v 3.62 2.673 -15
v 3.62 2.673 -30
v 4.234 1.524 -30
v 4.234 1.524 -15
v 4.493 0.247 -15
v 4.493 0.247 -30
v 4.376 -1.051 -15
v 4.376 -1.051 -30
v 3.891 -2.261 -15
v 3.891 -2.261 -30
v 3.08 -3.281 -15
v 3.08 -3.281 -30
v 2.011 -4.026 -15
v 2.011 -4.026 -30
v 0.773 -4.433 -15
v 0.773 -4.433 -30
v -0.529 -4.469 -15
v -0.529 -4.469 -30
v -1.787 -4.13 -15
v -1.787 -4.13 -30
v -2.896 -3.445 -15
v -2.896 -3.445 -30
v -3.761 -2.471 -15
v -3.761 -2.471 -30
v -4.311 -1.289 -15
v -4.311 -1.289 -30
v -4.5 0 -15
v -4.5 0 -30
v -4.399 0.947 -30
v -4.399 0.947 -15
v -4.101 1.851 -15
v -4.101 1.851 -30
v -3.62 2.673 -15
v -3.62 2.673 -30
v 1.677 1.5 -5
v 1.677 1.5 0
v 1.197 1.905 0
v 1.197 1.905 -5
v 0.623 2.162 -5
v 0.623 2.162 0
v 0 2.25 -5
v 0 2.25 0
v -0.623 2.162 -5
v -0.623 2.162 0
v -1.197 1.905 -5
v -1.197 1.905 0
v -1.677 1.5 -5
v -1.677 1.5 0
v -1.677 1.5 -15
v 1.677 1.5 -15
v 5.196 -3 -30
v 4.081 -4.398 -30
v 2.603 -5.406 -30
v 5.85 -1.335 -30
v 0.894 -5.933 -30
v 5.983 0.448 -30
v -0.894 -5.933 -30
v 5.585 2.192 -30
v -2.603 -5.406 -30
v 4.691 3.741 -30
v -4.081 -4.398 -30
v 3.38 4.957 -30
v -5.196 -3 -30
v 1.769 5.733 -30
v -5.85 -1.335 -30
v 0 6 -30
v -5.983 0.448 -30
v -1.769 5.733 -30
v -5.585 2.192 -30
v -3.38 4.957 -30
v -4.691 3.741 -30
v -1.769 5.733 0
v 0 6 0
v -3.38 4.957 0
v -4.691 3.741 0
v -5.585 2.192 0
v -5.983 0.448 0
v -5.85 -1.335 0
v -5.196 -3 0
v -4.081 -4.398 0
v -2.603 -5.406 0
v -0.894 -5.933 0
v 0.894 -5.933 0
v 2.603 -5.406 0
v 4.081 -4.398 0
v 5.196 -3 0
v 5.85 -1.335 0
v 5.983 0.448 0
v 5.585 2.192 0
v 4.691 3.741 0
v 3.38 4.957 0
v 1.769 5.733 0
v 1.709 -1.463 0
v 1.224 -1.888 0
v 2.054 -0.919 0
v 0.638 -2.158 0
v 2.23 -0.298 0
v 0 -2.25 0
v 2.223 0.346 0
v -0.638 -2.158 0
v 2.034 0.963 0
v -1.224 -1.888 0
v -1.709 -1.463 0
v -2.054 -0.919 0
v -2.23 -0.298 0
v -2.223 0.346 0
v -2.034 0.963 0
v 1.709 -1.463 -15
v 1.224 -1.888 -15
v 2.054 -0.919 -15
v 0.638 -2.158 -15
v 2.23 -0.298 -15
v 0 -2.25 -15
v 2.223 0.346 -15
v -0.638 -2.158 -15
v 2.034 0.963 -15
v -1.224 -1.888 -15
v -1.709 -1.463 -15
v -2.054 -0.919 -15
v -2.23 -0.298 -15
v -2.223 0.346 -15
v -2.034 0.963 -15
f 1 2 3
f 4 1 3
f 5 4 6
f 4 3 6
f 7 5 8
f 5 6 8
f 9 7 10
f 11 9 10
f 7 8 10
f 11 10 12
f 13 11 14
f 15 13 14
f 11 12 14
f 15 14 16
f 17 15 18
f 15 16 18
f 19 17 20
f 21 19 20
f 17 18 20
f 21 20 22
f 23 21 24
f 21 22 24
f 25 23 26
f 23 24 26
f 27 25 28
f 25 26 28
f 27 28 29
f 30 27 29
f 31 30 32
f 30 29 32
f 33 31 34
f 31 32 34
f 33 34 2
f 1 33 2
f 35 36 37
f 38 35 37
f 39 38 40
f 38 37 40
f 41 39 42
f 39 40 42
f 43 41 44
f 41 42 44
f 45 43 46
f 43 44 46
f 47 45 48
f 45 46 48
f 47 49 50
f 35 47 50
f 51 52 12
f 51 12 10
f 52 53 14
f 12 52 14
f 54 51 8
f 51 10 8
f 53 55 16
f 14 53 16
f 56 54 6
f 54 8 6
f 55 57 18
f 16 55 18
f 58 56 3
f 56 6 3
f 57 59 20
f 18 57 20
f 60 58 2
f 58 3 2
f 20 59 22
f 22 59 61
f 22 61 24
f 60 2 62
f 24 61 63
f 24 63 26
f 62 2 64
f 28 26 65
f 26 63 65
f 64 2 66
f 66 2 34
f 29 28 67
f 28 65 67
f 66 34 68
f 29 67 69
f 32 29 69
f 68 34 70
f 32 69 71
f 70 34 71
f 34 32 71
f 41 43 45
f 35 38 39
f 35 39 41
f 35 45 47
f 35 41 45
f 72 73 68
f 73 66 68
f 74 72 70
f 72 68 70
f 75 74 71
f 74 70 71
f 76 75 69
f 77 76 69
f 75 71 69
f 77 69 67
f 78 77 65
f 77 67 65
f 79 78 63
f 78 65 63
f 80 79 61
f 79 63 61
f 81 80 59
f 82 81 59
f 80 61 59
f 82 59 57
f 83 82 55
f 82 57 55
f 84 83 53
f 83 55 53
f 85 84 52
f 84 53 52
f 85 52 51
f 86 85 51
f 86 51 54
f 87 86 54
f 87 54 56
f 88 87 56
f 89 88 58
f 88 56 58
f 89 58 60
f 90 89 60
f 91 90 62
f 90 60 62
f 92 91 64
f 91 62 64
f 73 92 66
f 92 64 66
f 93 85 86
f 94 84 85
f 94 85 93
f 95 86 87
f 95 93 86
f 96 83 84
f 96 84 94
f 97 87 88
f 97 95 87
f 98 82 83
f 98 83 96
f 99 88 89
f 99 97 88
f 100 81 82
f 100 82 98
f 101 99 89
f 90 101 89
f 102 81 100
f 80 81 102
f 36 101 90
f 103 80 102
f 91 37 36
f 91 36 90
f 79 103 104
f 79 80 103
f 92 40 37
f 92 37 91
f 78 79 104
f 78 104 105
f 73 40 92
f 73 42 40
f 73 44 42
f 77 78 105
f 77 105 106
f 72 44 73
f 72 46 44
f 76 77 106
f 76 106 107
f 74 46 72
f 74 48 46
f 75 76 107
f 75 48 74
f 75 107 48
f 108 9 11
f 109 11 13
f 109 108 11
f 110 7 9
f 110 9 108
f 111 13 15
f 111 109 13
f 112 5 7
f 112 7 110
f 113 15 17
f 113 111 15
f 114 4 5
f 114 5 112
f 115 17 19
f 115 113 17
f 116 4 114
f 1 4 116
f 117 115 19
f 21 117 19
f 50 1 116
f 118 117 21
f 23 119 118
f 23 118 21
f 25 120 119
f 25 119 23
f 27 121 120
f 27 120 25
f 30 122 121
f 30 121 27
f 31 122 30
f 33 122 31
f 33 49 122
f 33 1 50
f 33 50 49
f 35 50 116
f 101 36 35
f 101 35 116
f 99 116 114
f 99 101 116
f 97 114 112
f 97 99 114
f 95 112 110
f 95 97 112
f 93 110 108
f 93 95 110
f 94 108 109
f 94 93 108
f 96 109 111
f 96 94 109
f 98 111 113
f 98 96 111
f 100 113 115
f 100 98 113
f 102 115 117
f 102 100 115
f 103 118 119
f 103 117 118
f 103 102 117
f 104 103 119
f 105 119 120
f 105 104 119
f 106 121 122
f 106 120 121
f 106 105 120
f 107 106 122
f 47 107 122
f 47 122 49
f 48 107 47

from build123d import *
from build123d.topology import SkipClean

# Parameters (mm, degrees)
ESQUISSE1_W             = 30
ESQUISSE1_H             = 6
ENL_V_MAT_EXTRU_4_DEPTH = 5
ENL_V_MAT_EXTRU_5_DEPTH = 18
ENL_V_MAT_EXTRU_6_DEPTH = 15


with BuildPart() as part:
    # Esquisse1 → Révolution1 (revolve)
    with BuildSketch(Plane(origin=(0, 0, 0), x_dir=(0, 0, -1), z_dir=(1, 0, 0)), mode=Mode.PRIVATE) as r_volution1_sk:
        with Locations((15, -3)):
            Rectangle(ESQUISSE1_W, ESQUISSE1_H)
    revolve(r_volution1_sk.sketch.rotate(Axis((0, 0, -30), (0, 0, 1)), 180), axis=Axis((0, 0, -30), (0, 0, 1)))

    # Esquisse2 → Enlèv. mat.-Extru.4 (cut)
    with BuildSketch(Plane.XY):
        with BuildLine():
            Line((-1.677050983, 1.5), (0, 1.5))
            Line((0, 1.5), (1.677050983, 1.5))
            ThreePointArc((1.677050983, 1.5), (0, 2.25), (-1.677050983, 1.5))
        make_face()
    extrude(amount=-ENL_V_MAT_EXTRU_4_DEPTH, mode=Mode.SUBTRACT)

    # Esquisse5 → Enlèv. mat.-Extru.5 (cut)
    with SkipClean():  # the faces are left unmerged after this step: merging them gives an invalid solid
        with BuildSketch(Plane.XY):
            with BuildLine():
                Line((-1.677050983, 1.5), (1.677050983, 1.5))
                ThreePointArc((1.677050983, 1.5), (0, -2.25), (-1.677050983, 1.5))
            make_face()
        extrude(amount=-ENL_V_MAT_EXTRU_5_DEPTH, mode=Mode.SUBTRACT)

    # Esquisse3 → Enlèv. mat.-Extru.6 (cut)
    with BuildSketch(Plane(origin=(0, 0, -30), x_dir=(-1, 0, 0), z_dir=(0, 0, -1))):
        with BuildLine():
            Line((3.620032518, 2.673081474), (-3.620032518, 2.673081474))
            ThreePointArc((-3.620032518, 2.673081474), (-1.407098729, -4.274350613), (4.5, 0))
            ThreePointArc((4.5, 0), (4.274350613, 1.407098729), (3.620032518, 2.673081474))
        make_face()
    extrude(amount=-ENL_V_MAT_EXTRU_6_DEPTH, mode=Mode.SUBTRACT)


solid = part.part
